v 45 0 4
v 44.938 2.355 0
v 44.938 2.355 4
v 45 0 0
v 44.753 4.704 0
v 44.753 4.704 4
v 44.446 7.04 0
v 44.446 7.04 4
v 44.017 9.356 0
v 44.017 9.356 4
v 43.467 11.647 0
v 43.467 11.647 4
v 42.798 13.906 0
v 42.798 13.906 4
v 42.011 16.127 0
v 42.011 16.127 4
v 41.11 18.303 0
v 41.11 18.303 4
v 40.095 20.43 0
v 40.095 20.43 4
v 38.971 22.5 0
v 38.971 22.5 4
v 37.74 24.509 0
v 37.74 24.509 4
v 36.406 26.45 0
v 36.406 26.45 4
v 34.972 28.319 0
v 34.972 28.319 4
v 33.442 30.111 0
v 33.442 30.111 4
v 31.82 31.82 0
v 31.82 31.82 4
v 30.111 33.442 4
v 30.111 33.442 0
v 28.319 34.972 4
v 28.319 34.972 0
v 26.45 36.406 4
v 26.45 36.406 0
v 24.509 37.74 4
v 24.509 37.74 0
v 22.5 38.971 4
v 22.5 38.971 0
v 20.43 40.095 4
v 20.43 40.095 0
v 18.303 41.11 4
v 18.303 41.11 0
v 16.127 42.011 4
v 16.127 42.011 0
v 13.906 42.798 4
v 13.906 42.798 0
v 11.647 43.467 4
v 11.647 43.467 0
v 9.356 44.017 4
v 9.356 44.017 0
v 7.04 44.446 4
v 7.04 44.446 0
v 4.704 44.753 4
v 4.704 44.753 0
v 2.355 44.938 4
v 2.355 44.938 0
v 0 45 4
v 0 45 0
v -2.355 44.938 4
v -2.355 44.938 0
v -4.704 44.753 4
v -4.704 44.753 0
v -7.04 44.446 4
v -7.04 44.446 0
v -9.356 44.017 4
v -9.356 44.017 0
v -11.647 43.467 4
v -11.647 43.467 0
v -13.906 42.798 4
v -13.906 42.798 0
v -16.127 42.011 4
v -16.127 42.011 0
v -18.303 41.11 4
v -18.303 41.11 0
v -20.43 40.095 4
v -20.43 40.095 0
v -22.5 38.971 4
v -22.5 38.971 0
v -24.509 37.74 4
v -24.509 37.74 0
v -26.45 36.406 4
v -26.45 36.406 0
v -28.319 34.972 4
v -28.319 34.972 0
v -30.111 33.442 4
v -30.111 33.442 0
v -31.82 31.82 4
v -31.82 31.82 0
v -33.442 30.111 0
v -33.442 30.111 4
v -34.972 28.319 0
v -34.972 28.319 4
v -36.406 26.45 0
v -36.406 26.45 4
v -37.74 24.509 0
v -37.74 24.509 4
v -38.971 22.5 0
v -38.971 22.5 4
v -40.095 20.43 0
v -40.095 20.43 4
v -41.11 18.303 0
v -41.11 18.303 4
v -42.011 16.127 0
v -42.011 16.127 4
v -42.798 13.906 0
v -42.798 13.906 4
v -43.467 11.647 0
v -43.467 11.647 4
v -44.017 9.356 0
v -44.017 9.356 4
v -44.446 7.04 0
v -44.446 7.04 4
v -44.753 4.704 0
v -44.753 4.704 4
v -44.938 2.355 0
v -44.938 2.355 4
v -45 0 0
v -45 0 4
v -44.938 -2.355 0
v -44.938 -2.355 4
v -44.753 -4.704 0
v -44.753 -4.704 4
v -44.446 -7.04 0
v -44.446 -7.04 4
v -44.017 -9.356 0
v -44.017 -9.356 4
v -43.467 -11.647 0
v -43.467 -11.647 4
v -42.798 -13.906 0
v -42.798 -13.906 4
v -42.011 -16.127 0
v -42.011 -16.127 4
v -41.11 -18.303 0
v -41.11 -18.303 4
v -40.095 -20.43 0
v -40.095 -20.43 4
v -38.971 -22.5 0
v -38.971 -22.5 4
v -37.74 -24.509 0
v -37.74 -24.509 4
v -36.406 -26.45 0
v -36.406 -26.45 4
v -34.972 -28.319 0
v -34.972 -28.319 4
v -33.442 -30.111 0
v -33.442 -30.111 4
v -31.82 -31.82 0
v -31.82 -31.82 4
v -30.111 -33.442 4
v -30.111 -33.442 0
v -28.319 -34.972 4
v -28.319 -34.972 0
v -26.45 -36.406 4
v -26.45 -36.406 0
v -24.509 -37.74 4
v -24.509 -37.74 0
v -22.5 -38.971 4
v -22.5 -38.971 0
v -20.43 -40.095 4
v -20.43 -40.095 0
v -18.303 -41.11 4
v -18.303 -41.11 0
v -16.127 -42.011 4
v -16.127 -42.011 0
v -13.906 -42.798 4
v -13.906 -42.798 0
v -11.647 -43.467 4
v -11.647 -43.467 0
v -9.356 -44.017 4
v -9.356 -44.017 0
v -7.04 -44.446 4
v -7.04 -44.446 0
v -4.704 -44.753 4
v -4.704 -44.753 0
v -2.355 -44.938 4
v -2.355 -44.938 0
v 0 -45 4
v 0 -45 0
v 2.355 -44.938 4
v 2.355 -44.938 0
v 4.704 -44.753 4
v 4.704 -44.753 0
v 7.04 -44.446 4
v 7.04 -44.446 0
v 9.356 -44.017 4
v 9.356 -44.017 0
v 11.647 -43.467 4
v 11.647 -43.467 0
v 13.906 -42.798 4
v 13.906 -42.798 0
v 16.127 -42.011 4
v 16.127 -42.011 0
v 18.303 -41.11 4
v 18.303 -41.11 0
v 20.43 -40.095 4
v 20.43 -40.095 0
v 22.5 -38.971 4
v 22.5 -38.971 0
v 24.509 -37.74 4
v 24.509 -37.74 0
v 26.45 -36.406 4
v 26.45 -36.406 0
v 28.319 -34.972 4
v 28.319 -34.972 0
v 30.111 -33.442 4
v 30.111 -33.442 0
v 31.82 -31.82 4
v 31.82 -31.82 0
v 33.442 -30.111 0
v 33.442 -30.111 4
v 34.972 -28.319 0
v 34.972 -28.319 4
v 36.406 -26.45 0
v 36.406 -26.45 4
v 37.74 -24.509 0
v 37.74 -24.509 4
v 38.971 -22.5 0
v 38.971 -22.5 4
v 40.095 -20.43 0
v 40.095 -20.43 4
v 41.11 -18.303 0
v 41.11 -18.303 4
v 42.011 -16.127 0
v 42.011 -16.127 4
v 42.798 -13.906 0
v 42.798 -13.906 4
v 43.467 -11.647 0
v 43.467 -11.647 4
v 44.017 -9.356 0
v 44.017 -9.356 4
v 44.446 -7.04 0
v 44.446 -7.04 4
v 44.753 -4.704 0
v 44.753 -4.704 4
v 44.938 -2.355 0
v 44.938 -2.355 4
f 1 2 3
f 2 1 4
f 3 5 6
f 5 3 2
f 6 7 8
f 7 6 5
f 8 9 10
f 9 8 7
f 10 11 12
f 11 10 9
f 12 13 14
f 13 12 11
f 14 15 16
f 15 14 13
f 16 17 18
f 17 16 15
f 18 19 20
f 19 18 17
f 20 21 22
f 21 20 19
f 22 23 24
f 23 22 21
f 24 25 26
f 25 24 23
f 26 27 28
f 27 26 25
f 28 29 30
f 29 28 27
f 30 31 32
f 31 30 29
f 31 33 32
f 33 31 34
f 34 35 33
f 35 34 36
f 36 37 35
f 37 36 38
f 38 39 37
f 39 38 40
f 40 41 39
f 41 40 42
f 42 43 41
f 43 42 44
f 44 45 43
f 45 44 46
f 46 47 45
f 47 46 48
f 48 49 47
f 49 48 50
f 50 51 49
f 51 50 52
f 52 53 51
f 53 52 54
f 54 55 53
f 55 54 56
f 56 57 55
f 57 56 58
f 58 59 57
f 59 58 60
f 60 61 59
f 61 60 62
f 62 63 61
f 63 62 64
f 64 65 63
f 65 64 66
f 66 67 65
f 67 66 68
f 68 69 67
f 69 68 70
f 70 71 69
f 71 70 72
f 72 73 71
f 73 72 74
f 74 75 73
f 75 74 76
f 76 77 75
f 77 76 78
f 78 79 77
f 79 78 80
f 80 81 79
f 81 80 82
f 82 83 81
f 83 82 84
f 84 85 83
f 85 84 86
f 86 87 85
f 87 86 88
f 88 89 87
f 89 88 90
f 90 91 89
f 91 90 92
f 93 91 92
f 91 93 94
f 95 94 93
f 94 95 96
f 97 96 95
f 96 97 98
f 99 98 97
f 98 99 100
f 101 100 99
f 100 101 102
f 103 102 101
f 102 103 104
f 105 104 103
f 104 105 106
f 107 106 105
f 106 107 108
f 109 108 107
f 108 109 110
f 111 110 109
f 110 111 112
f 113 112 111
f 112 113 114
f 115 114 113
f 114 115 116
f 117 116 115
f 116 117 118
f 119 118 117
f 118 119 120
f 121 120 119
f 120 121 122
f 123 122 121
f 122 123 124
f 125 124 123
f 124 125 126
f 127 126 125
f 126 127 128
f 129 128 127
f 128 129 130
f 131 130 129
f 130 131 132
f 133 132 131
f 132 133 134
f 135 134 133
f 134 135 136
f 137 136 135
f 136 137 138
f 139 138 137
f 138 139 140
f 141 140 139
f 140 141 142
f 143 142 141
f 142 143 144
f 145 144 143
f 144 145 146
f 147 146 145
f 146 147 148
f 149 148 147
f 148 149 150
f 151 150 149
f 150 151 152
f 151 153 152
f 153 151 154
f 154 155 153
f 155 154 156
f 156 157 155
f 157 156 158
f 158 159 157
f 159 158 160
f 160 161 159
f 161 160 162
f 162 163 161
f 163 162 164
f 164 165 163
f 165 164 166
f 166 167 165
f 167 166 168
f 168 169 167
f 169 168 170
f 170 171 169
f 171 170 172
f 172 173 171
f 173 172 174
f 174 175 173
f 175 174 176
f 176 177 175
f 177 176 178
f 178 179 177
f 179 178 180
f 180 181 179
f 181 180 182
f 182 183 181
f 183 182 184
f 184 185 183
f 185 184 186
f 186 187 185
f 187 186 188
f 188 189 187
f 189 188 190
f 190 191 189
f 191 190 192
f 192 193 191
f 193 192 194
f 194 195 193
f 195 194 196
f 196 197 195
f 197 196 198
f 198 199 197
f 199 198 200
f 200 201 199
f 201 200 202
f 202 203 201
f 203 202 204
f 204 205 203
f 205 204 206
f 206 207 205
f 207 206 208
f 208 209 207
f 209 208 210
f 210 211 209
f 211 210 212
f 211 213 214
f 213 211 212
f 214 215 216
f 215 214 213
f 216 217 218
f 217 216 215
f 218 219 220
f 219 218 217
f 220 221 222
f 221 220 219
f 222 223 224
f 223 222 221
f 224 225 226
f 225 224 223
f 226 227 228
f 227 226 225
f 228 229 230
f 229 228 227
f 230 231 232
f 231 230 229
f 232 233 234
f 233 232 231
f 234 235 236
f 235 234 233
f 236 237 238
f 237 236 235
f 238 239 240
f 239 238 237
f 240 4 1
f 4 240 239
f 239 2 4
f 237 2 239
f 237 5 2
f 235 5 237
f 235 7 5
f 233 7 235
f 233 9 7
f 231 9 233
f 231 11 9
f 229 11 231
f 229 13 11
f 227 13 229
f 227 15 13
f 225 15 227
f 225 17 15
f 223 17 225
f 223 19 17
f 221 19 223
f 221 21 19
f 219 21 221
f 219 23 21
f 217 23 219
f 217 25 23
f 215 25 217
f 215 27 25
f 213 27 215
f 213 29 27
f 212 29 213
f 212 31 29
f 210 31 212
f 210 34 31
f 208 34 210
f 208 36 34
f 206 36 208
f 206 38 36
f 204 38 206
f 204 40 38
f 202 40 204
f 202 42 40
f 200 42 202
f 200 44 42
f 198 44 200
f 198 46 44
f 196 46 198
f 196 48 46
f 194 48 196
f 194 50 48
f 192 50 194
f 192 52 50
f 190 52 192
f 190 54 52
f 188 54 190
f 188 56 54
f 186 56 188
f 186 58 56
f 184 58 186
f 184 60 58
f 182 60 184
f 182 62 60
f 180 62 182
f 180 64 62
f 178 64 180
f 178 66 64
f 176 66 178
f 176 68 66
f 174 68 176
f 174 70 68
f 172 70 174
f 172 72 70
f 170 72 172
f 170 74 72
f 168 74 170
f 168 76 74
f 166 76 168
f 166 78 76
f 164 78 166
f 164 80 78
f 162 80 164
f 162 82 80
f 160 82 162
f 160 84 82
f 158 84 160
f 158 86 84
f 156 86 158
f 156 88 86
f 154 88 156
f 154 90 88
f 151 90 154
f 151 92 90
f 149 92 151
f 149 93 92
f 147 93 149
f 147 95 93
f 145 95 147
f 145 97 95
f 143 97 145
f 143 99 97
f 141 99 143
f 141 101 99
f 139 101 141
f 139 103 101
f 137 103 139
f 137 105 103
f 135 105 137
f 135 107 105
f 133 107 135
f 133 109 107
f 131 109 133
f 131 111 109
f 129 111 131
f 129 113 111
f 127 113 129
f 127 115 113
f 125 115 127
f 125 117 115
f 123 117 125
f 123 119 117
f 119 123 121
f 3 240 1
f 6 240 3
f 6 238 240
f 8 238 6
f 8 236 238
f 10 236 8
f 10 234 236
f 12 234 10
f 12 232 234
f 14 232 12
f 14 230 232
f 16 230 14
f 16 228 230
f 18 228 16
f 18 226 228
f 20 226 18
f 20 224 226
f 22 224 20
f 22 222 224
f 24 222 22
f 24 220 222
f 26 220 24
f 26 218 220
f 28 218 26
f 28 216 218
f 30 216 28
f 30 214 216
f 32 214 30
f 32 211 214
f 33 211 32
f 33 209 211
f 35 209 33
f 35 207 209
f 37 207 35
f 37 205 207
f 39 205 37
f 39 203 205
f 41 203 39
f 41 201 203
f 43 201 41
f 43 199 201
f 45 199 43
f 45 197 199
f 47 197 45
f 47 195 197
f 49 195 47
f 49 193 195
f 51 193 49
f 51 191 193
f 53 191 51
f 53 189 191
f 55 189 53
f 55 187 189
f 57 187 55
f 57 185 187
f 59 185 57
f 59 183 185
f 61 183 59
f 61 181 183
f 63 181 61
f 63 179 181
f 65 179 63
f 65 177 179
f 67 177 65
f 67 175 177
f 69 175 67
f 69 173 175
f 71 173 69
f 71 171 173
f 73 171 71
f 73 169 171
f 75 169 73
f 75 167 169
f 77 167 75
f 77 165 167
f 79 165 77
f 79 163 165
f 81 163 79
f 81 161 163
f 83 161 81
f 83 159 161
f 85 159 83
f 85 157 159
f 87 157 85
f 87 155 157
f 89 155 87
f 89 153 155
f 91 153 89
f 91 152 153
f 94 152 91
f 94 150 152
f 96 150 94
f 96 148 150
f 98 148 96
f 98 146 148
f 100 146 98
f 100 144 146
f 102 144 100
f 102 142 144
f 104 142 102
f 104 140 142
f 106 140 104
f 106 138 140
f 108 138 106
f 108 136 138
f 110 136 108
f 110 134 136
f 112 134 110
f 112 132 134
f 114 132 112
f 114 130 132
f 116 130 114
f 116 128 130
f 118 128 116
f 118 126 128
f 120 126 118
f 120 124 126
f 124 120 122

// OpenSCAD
// file: ../common/common.scad
// (C) 2023 Dmytry Lavrov

module box(low, high){
    translate(low){
        cube(high-low);
    }
}

module mirror_duplicate(v){
    children();
    mirror(v=v)children();
}

module x_mirror(){
    mirror_duplicate(v=[1,0,0])children();
}
module y_mirror(){
    mirror_duplicate(v=[0,1,0])children();
}
module xy_mirror(){
    mirror_duplicate(v=[1,0,0])mirror_duplicate(v=[0,1,0])children();
}

module four_corners(low, high){
    translate([low[0], low[1], 0])children();
    translate([high[0], low[1], 0])children();
    translate([high[0], high[1], 0])children();
    translate([low[0], high[1], 0])children();  
}

module cyl_rounded_box(low, high, r){
    h=high[2]-low[2];
    translate([0, 0, low[2]]){
        hull(){
            translate([low[0]+r, low[1]+r, 0])cylinder(h, r=r);
            translate([high[0]-r, low[1]+r, 0])cylinder(h, r=r);
            translate([high[0]-r, high[1]-r, 0])cylinder(h, r=r);
            translate([low[0]+r, high[1]-r, 0])cylinder(h, r=r);
        }
    }
}

module rounded_box(l, h, r){
    hull(){
        translate([l[0]+r, l[1]+r, l[2]+r])sphere(r);        
        translate([l[0]+r, l[1]+r, h[2]-r]) sphere(r);
        translate([l[0]+r, h[1]-r, l[2]+r]) sphere(r);
        translate([l[0]+r, h[1]-r, h[2]-r]) sphere(r);
        
        translate([h[0]-r, l[1]+r, l[2]+r]) sphere(r);
        translate([h[0]-r, l[1]+r, h[2]-r]) sphere(r);
        translate([h[0]-r, h[1]-r, l[2]+r]) sphere(r);
        translate([h[0]-r, h[1]-r, h[2]-r]) sphere(r);
    }
}

module skel_cyl_rounded_box(low, high, ir, or, outer=true, right_side=true){
    h=high[2]-low[2];
    translate([0, 0, low[2]])
    difference(){
        union(){
            translate([low[0], low[1], 0])cylinder(h, r=or);
            translate([high[0], low[1], 0])cylinder(h, r=or);
            translate([high[0], high[1], 0])cylinder(h, r=or);
            translate([low[0], high[1], 0])cylinder(h, r=or);
            // outer shell
            if(outer){
                box([low[0], low[1]-or, 0], [high[0], low[1]-ir, h]);            
                box([low[0], high[1]+ir, 0], [high[0], high[1]+or, h]);
                
                box([low[0]-or, low[1], 0], [low[0]-ir, high[1], h]);
                
                if(right_side)box([high[0]+ir, low[1], 0], [high[0]+or, high[1], h]);
            }

            // inner shell            
            box([low[0], low[1]+ir, 0], [high[0], low[1]+or, h]);            
            box([low[0], high[1]-or, 0], [high[0], high[1]-ir, h]);
            
            box([low[0]+ir, low[1], 0], [low[0]+or, high[1], h]);
            box([high[0]-or, low[1], 0], [high[0]-ir, high[1], h]);
        }
        translate([low[0], low[1], 0])cylinder(h, r=ir);
        translate([high[0], low[1], 0])cylinder(h, r=ir);
        translate([high[0], high[1], 0])cylinder(h, r=ir);
        translate([low[0], high[1], 0])cylinder(h, r=ir);
    }
}

module sequential_hull(){
    if($children<2){
        hull()children();
    }else{
        for (i = [0: $children-2])
            hull(){
                children(i);
                children(i+1);
            }
    }
}

module teardrop(r){// sphere with a hat, purpose: avoid overhangs
    union(){
        sphere(r);
        translate([0,0,r*sqrt(0.5)])cylinder(r*sqrt(0.5), r1=r*sqrt(0.5), r2=0);
    }
}

module up(z){
    translate([0,0,z])children();
}
// main file
// (C) 2023 Dmytry Lavrov.
use <../common/common.scad>

$fa=3;
$fs=0.2;
cylinder(4, r=45);
